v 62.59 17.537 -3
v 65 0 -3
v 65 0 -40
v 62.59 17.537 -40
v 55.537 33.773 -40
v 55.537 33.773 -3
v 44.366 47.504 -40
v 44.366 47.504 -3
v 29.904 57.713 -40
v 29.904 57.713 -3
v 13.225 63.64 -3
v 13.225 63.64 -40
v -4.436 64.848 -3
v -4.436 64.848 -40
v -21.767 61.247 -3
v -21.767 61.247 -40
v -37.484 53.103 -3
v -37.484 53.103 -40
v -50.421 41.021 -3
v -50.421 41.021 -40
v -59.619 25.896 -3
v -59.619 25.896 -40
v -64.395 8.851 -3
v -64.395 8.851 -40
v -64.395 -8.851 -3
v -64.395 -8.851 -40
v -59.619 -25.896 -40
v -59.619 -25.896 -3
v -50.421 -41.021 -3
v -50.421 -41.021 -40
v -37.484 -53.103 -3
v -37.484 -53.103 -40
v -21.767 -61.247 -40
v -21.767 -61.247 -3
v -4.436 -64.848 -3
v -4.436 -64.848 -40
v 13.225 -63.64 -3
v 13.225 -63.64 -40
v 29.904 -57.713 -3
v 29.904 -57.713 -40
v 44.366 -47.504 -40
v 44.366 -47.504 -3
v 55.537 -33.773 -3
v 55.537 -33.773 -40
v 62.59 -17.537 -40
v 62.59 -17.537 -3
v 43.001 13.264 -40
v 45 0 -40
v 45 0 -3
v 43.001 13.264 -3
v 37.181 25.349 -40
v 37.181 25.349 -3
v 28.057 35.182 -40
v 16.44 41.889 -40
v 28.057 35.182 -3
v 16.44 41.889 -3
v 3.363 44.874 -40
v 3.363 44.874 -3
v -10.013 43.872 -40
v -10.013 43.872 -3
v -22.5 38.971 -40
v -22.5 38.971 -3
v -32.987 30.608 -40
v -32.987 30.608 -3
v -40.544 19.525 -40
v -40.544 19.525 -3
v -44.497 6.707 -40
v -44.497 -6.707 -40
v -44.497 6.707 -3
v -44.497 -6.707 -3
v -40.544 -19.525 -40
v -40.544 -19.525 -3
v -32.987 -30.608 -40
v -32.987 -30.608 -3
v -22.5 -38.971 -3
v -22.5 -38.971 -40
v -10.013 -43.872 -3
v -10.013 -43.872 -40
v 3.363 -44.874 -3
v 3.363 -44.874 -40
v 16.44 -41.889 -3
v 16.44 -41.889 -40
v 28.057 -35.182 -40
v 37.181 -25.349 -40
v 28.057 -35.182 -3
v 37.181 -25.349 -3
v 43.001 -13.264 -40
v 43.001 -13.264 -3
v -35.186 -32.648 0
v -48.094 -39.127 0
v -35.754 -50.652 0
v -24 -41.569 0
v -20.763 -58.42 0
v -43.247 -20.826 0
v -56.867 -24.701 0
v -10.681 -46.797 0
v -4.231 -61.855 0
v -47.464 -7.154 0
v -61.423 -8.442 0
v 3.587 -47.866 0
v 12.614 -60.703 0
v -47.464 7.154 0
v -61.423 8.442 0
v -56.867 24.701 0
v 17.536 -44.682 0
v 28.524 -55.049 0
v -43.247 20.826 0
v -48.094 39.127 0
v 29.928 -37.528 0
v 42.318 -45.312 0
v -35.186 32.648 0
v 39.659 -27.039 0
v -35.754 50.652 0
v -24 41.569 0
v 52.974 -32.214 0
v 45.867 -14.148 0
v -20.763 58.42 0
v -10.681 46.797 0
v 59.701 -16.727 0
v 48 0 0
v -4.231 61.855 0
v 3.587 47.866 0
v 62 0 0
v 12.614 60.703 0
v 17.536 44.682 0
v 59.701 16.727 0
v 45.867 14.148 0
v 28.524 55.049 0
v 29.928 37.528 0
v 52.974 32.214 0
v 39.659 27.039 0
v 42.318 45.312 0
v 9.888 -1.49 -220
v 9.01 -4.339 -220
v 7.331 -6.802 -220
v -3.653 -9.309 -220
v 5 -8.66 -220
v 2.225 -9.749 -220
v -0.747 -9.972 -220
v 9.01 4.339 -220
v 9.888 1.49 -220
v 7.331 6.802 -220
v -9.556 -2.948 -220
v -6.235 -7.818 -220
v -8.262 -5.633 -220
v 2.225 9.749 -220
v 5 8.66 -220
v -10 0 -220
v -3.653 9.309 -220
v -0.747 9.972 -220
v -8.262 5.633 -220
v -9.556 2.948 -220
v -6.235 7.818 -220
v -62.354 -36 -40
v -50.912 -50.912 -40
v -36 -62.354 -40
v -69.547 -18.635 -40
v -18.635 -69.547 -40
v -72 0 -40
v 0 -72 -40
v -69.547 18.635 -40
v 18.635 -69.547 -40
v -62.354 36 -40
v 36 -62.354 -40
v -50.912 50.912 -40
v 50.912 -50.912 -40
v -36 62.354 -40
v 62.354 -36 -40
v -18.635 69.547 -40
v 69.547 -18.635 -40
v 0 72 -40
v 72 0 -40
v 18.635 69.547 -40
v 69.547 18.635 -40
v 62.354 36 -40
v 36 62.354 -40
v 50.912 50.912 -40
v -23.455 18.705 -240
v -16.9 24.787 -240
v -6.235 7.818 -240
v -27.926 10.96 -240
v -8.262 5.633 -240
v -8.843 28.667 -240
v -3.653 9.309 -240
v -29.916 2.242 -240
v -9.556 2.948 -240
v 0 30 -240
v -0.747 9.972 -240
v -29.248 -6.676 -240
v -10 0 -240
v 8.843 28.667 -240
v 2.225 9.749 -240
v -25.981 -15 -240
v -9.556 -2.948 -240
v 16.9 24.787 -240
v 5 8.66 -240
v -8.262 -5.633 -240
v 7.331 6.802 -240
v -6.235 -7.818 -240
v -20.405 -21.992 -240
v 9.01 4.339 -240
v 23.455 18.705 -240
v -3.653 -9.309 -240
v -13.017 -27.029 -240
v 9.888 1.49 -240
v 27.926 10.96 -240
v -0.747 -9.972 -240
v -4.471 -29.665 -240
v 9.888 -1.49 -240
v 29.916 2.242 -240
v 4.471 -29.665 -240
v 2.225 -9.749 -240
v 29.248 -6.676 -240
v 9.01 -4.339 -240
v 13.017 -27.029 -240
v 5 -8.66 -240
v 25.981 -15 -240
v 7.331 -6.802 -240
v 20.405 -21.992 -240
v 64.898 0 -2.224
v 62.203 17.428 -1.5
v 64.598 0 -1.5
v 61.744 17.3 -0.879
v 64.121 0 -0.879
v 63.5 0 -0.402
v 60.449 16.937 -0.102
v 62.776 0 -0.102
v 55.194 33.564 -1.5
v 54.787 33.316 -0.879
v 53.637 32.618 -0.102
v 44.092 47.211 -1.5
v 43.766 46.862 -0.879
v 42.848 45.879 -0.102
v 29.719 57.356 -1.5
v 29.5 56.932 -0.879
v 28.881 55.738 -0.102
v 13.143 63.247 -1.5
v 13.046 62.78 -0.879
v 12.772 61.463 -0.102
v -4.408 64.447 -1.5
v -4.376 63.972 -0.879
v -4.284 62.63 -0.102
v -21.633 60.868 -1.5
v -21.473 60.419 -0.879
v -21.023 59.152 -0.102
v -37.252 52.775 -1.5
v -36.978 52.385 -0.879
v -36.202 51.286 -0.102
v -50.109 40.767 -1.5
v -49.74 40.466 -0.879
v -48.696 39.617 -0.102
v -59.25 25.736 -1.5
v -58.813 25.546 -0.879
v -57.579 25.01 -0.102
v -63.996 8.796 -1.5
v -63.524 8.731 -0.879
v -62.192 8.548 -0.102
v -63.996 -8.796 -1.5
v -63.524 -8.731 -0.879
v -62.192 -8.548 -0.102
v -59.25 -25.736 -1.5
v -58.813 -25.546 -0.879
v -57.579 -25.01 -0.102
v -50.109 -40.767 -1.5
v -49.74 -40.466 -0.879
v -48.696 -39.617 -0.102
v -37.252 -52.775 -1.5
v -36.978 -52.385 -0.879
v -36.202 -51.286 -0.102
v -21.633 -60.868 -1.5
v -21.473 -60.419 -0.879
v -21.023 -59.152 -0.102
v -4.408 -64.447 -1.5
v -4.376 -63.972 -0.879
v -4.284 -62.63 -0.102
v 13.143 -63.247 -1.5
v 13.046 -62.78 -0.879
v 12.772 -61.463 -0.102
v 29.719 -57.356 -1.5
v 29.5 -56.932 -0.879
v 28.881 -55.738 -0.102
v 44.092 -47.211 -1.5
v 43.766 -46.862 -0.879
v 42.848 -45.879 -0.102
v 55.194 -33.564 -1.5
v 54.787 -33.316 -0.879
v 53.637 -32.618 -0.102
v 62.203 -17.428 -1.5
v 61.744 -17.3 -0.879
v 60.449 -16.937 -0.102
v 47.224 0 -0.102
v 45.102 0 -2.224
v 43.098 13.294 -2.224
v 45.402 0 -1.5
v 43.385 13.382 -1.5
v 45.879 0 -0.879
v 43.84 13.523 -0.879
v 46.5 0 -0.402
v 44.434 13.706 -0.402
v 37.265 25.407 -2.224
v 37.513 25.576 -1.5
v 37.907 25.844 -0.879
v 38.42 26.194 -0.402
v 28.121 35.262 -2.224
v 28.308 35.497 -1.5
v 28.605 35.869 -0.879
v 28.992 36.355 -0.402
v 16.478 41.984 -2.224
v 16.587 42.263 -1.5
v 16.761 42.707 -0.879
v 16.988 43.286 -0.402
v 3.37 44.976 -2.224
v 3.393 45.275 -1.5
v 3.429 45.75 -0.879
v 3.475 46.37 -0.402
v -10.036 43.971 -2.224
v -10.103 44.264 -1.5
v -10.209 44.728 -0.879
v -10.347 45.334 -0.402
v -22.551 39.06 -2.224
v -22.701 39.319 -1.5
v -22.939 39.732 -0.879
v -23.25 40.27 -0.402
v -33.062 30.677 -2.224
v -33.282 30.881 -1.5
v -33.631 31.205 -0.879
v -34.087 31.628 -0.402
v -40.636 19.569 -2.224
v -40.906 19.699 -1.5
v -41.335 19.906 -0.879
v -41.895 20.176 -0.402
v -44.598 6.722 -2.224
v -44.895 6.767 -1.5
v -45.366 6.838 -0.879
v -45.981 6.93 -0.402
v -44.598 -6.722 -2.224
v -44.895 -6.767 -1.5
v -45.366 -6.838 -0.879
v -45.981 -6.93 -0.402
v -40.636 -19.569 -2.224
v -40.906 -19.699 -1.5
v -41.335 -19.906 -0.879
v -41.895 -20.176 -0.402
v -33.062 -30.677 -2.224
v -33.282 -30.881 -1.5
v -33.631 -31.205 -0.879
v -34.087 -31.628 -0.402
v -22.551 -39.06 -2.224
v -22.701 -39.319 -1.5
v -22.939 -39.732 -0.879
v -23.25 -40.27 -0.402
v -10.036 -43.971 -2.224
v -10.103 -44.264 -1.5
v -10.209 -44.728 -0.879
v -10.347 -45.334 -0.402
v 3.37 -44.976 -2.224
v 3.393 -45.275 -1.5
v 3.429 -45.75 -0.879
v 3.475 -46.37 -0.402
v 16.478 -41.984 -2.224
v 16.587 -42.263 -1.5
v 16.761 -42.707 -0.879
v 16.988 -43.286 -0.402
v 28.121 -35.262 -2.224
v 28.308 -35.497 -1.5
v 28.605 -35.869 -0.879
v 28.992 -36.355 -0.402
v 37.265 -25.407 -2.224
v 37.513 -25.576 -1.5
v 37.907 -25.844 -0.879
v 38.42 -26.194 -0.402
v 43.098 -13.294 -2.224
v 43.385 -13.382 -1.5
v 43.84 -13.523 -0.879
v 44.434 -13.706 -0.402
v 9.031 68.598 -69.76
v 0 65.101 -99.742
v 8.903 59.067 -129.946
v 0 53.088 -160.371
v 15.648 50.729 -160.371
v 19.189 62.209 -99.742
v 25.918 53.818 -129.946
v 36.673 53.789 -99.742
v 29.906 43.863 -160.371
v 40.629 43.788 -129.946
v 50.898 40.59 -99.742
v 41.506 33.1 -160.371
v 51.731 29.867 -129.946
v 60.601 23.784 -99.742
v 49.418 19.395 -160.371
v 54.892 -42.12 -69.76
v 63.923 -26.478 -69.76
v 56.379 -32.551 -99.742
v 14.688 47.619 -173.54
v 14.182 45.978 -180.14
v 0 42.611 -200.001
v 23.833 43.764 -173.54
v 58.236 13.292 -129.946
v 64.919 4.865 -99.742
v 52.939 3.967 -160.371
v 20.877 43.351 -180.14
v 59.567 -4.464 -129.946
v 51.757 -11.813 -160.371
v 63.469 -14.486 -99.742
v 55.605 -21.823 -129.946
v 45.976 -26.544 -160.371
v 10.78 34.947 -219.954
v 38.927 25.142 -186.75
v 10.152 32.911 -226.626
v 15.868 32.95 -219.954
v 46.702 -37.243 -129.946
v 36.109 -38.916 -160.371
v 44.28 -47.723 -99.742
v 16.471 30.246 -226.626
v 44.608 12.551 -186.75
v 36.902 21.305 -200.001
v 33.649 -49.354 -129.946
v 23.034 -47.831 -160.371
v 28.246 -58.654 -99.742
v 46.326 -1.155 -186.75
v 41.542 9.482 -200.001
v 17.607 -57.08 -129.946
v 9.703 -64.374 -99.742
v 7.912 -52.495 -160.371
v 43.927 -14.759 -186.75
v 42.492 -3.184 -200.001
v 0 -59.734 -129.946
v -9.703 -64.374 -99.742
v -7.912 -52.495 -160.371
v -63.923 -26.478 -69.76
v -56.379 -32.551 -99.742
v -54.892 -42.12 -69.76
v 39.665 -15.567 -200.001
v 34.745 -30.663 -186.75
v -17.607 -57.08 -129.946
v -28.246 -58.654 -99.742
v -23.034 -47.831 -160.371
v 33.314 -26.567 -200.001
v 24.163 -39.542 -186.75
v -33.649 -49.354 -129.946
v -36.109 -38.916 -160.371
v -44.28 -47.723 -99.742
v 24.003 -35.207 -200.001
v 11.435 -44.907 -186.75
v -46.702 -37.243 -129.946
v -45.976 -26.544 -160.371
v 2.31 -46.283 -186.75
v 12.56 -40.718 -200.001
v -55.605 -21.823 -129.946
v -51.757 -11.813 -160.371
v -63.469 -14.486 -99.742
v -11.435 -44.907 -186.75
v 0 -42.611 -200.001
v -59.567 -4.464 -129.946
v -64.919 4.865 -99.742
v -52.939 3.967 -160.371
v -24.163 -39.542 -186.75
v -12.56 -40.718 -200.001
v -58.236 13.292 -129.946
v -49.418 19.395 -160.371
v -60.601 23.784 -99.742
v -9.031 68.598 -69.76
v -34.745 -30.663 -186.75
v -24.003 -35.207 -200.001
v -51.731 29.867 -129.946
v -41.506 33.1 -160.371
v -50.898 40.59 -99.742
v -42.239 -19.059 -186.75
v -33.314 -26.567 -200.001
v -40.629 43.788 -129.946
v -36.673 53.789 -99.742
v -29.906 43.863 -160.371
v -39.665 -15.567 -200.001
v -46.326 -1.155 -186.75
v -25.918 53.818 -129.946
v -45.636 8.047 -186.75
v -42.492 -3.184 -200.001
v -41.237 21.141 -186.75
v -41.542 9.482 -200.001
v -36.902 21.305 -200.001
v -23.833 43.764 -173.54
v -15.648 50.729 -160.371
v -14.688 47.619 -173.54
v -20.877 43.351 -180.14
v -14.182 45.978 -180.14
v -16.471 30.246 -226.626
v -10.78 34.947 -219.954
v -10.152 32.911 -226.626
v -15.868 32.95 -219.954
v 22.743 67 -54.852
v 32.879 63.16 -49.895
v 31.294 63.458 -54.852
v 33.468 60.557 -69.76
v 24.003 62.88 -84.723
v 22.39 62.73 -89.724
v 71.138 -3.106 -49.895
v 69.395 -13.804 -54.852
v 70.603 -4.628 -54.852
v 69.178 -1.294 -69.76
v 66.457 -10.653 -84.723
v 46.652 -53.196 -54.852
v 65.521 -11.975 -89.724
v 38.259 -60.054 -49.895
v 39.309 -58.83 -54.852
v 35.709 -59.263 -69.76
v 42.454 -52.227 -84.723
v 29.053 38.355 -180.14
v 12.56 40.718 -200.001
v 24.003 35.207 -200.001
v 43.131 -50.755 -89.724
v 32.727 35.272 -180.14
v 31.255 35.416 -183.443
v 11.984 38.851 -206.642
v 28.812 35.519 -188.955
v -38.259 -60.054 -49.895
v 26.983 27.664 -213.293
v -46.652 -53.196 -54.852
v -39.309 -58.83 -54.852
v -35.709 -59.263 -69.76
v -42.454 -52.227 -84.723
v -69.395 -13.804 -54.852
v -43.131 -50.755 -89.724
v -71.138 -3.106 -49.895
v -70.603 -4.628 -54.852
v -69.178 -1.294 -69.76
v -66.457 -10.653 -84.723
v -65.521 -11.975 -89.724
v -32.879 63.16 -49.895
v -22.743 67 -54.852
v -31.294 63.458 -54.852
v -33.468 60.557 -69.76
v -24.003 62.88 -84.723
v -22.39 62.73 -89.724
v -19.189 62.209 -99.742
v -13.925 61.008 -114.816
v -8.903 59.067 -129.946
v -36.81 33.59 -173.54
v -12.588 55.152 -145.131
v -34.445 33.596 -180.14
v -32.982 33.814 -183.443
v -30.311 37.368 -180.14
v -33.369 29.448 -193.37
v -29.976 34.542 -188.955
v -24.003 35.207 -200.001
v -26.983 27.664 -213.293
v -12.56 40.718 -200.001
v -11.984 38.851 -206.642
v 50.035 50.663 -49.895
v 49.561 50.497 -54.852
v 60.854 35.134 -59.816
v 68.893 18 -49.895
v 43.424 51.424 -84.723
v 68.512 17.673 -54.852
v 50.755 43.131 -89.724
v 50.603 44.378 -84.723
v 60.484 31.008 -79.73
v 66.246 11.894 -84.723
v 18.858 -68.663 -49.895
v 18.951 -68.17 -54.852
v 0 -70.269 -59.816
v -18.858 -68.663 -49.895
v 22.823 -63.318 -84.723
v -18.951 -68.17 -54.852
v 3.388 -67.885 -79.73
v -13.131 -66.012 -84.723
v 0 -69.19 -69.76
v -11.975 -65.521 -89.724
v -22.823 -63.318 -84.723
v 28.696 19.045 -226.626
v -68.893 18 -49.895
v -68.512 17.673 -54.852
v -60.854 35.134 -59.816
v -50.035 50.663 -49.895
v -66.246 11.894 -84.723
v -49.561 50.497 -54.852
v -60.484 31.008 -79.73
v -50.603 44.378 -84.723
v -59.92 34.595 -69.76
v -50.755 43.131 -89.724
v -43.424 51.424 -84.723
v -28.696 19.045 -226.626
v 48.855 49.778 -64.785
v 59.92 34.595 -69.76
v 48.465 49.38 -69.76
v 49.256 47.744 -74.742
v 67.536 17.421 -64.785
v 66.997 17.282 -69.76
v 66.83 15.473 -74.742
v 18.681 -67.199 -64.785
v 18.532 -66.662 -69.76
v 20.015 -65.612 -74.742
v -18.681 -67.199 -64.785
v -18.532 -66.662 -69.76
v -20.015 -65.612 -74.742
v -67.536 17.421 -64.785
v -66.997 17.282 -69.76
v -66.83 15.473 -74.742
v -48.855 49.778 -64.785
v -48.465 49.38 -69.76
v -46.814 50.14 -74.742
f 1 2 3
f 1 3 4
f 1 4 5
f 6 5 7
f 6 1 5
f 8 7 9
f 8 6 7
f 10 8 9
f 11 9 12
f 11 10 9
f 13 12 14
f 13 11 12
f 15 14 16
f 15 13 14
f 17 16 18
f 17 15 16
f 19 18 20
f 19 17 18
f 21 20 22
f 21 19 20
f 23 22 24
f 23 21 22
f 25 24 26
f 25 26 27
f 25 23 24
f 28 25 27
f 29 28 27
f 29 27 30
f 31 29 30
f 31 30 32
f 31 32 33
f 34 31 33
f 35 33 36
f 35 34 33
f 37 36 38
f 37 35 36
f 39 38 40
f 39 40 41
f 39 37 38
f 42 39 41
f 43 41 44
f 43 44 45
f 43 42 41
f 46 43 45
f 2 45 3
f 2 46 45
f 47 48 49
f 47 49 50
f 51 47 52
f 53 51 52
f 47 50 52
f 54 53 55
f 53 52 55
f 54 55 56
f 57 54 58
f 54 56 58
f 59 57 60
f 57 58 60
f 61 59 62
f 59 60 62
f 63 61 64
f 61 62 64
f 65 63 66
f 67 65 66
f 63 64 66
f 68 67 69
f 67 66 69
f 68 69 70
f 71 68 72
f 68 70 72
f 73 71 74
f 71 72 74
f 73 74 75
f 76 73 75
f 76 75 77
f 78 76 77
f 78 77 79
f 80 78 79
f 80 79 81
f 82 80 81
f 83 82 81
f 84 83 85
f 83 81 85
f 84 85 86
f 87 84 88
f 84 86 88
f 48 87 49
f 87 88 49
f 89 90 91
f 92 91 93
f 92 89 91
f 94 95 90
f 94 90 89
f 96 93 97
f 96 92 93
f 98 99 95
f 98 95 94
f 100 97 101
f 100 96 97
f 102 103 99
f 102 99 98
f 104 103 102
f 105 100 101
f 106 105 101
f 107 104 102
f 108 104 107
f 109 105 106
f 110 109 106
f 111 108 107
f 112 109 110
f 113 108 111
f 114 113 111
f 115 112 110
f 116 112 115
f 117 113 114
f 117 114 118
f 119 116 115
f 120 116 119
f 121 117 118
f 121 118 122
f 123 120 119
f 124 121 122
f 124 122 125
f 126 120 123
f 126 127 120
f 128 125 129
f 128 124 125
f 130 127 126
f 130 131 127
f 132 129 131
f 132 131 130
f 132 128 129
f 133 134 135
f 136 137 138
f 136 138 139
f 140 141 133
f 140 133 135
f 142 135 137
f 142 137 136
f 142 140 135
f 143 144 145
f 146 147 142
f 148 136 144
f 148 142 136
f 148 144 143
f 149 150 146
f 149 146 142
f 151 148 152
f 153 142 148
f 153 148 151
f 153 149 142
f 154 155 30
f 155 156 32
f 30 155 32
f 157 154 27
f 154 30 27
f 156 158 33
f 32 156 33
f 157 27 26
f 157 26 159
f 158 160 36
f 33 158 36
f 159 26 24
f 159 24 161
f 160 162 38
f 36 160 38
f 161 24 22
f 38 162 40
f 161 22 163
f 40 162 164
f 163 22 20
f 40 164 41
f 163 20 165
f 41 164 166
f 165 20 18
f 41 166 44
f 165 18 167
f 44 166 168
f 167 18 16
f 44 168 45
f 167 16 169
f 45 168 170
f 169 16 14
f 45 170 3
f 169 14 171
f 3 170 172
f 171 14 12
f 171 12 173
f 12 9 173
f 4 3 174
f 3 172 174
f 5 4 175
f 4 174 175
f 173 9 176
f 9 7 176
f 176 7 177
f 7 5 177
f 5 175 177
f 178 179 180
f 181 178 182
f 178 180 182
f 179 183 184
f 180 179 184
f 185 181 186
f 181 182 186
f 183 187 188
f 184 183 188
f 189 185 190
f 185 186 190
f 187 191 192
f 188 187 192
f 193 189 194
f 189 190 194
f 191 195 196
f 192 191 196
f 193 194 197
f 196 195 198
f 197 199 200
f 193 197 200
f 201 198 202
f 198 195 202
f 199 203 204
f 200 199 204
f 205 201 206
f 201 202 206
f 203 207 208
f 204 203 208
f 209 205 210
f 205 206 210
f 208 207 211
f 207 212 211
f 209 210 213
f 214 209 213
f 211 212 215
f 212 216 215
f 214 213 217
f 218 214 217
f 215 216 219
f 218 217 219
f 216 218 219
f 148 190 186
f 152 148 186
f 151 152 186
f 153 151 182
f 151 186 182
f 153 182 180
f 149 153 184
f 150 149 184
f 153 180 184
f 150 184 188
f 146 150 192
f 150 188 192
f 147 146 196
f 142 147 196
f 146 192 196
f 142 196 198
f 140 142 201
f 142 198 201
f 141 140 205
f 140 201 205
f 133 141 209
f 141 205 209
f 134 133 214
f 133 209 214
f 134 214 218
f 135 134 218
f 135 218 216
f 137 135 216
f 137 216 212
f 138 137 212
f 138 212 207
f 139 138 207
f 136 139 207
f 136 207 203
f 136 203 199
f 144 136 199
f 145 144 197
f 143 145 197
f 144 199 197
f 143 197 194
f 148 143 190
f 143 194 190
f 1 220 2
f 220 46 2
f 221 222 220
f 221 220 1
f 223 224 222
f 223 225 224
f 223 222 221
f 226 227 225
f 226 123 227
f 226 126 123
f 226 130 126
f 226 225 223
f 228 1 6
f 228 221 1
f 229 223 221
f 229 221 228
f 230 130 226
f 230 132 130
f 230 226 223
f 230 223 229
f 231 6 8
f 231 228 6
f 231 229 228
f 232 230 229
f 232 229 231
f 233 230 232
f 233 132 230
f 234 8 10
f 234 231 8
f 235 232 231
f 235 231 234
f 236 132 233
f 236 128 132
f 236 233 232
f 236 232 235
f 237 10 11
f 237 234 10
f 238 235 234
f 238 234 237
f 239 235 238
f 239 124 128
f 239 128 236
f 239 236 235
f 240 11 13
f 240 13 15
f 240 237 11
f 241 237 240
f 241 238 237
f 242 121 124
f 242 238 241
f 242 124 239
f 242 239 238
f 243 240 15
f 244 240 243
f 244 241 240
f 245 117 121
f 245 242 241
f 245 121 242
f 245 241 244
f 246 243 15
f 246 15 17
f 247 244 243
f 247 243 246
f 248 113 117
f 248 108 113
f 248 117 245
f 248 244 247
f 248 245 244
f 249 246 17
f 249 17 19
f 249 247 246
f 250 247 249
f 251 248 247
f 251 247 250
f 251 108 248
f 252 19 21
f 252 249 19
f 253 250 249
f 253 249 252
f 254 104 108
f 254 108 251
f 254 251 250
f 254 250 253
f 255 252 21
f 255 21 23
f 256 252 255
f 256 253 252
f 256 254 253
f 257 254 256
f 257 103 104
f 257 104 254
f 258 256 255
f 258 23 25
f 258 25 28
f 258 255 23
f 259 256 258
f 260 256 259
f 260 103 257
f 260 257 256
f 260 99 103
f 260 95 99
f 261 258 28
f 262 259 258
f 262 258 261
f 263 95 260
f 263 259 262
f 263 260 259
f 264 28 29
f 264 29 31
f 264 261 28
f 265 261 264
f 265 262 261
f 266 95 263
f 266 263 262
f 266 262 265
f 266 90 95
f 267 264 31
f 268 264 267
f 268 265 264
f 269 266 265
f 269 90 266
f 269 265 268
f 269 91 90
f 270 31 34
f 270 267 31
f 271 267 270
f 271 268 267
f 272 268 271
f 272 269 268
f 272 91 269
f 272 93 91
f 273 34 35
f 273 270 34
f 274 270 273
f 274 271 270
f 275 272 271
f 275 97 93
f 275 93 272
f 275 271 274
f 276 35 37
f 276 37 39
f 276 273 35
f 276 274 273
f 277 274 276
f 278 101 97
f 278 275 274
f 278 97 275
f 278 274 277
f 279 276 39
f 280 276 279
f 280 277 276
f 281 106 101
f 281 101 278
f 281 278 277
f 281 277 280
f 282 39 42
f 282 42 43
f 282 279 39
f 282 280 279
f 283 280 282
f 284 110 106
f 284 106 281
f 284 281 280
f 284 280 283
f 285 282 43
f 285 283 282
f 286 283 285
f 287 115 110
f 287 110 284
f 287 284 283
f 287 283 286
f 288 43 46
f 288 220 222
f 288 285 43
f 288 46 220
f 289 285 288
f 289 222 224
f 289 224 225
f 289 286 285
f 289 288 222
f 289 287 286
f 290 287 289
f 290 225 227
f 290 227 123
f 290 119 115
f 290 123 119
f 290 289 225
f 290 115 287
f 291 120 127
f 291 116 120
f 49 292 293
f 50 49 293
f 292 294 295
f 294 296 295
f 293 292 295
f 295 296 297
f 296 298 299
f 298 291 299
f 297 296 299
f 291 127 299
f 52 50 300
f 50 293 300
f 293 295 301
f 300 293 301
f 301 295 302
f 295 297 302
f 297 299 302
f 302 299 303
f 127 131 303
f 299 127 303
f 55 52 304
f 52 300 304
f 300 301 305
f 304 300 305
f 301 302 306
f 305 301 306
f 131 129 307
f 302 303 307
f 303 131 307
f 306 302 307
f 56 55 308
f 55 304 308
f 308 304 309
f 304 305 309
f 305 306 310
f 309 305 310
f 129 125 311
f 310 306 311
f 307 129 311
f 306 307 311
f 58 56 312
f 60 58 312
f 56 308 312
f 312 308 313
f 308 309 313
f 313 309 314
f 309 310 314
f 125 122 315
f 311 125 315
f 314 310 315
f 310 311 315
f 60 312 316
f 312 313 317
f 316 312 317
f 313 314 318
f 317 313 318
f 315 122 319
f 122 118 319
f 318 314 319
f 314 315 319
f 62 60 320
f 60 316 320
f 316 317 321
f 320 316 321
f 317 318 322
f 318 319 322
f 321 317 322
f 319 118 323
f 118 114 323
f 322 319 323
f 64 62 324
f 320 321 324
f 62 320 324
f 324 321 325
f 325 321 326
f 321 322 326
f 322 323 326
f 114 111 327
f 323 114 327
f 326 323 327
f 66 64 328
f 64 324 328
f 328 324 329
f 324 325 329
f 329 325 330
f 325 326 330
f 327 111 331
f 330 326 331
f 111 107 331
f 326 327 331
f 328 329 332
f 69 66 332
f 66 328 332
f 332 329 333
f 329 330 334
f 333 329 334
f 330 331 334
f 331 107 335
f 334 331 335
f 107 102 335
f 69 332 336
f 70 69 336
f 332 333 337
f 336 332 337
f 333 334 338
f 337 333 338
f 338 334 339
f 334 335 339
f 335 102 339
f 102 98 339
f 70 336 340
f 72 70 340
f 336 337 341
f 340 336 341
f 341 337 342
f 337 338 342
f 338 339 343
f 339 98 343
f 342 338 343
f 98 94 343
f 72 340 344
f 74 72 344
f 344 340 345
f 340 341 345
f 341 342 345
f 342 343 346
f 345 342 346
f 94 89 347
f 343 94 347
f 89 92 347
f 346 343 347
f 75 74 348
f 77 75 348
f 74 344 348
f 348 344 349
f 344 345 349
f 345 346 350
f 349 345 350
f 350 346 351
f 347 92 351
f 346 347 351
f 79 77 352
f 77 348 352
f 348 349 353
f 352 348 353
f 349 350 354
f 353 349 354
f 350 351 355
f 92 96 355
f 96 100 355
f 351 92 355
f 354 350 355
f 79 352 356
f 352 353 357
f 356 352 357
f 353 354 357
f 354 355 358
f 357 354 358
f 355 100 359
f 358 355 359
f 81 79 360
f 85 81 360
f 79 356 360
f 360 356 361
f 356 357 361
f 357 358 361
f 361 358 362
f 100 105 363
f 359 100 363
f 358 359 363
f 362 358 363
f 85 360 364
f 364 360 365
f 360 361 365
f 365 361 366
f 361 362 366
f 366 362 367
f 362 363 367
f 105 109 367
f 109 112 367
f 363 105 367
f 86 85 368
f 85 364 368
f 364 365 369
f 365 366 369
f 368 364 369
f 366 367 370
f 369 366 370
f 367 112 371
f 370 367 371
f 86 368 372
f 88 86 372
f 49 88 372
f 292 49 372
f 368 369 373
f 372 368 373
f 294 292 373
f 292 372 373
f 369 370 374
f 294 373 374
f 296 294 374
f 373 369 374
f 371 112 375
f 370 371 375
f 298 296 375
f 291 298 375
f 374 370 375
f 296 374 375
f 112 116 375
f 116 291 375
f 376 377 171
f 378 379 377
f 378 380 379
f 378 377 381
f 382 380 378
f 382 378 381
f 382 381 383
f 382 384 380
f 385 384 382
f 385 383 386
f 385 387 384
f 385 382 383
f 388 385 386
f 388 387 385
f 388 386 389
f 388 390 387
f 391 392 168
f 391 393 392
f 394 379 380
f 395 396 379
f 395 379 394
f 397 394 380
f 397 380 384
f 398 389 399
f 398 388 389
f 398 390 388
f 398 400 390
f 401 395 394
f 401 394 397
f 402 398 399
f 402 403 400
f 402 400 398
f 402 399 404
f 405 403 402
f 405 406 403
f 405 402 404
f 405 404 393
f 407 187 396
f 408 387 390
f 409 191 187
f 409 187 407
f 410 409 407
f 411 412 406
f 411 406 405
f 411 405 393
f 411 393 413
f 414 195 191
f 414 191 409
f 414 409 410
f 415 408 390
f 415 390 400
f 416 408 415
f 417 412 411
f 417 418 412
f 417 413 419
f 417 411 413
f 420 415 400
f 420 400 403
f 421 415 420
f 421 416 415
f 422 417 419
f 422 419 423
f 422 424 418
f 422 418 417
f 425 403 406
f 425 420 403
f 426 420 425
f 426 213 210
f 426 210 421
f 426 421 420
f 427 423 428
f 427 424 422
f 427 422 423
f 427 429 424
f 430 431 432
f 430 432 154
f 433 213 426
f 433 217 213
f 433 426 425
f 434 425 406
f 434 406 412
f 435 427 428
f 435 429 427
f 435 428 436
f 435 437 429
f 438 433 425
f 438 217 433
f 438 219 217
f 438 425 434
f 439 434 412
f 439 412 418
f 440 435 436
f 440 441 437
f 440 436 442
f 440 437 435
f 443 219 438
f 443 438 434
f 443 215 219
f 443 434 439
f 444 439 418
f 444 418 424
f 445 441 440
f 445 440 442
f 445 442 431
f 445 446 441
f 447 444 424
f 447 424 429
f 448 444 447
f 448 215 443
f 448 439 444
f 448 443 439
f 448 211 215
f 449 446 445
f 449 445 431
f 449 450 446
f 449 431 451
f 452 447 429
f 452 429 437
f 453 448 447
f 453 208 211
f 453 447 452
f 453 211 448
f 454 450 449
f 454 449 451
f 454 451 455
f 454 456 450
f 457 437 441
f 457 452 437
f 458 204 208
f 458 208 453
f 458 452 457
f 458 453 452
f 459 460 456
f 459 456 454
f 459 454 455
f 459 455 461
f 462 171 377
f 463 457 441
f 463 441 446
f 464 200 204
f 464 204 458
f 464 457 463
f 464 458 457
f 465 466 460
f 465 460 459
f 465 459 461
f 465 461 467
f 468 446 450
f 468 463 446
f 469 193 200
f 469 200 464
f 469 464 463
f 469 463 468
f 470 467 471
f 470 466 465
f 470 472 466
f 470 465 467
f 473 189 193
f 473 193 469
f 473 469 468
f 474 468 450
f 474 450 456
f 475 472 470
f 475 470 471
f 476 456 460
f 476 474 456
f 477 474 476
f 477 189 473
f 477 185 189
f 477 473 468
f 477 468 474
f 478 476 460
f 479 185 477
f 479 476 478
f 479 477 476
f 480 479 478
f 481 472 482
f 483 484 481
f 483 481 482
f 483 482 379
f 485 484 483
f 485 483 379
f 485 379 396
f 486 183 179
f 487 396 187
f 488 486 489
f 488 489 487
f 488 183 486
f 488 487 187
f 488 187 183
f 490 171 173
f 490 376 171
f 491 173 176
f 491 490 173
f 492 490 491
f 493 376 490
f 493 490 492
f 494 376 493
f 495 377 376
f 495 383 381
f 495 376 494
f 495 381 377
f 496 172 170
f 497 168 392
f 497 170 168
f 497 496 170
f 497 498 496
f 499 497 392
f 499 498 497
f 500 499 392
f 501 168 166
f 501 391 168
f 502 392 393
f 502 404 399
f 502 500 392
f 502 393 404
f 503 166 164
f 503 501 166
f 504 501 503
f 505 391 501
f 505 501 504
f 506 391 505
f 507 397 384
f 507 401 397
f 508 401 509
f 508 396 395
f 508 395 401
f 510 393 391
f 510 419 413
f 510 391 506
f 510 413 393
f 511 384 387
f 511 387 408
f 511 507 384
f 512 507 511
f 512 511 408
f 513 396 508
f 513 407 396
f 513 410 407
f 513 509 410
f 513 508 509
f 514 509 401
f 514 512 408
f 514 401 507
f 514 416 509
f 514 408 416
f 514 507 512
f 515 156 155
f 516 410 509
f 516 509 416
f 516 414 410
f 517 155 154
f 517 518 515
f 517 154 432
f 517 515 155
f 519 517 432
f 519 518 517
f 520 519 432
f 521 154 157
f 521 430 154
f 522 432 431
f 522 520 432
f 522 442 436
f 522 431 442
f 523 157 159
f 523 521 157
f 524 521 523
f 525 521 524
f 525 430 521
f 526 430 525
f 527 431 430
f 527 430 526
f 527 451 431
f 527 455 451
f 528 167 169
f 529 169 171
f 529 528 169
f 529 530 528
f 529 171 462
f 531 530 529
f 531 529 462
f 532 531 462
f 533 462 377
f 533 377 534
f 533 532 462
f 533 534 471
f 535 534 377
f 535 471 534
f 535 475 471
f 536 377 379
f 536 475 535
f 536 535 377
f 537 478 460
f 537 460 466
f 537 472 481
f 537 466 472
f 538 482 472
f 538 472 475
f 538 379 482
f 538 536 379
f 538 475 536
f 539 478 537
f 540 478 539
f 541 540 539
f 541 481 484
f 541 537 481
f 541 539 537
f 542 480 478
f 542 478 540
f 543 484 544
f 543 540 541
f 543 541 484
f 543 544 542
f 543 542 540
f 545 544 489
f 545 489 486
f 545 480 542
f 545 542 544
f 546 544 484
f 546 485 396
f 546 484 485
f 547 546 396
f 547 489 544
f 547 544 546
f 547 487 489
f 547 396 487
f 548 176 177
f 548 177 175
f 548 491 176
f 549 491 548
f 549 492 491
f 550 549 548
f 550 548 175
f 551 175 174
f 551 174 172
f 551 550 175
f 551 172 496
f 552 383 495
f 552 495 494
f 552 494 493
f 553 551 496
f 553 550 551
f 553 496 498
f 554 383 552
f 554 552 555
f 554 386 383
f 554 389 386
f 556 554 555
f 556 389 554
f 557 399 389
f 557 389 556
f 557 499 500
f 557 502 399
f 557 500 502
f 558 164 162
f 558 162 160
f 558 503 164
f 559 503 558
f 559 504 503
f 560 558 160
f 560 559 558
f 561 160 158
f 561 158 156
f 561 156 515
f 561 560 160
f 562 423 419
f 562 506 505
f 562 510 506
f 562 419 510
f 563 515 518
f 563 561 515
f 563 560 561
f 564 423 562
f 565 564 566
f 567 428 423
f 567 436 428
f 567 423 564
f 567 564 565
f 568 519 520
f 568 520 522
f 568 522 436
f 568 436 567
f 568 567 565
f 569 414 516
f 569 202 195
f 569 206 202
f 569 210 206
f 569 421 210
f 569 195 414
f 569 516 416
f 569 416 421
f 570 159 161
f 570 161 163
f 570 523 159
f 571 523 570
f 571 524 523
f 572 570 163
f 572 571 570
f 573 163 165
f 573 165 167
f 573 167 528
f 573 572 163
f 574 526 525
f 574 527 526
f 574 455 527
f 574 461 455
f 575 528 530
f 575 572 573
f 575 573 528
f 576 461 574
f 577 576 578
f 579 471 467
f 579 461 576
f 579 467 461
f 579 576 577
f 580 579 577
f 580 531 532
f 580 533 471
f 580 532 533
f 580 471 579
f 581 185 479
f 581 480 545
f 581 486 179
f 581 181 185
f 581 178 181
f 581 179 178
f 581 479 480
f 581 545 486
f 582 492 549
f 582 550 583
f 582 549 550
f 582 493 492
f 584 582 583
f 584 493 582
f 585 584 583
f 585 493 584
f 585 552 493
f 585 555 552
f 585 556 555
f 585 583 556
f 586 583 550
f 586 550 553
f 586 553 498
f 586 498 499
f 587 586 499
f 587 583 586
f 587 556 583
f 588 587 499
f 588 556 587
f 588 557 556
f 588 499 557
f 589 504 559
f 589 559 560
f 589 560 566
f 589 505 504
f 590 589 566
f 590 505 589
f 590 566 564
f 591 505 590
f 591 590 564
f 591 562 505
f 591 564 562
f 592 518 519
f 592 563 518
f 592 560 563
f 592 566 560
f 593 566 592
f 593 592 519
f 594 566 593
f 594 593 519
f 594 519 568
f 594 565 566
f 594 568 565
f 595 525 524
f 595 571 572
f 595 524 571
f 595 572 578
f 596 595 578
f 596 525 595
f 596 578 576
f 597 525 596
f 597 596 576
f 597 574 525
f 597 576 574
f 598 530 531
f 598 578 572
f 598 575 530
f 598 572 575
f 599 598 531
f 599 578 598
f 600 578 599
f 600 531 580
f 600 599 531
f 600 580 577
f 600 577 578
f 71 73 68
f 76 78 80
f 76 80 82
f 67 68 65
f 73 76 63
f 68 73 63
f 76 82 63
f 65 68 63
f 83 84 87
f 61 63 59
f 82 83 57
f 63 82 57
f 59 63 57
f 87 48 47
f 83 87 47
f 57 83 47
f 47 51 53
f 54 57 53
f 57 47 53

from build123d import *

# Parameters (mm, degrees)
SKETCH1_R           = 65
SKETCH1_R_2         = 45
BOSS_EXTRUDE1_DEPTH = 40
FILLET1_R           = 3
SKETCH4_R           = 10
CUT_EXTRUDE1_DEPTH  = 20


with BuildPart() as part:
    # Sketch1 → Boss-Extrude1 (new body)
    with BuildSketch(Plane.XY):
        Circle(SKETCH1_R)
        Circle(SKETCH1_R_2, mode=Mode.SUBTRACT)
    extrude(amount=-BOSS_EXTRUDE1_DEPTH)

    # Fillet1
    fillet1_edges = [part.edges().sort_by_distance(p)[0] for p in [
        (-65, 0, 0),
        (-45, 0, 0),
    ]]
    fillet(fillet1_edges, radius=FILLET1_R)

    # Sketch2 → Revolve1 (revolve)
    with BuildSketch(Plane(origin=(0, 0, 0), x_dir=(0, 0, -1), z_dir=(1, 0, 0))):
        with BuildLine():
            Line((40, 0), (240, 0))
            Line((240, 0), (240, 30))
            add(Edge.make_bspline(
                [(40, 72), (137.597263884, 64.854508863), (240, 30)],
                knots=[0, 0, 0, 1, 1, 1], degree=2))
            Line((40, 72), (40, 0))
        make_face()
    revolve(axis=Axis((0, 0, -40), (0, 0, -1)))

    # Sketch4 → Cut-Extrude1 (cut)
    with BuildSketch(Plane(origin=(0, 0, -240), x_dir=(-1, 0, 0), z_dir=(0, 0, -1))):
        Circle(SKETCH4_R)
    extrude(amount=-CUT_EXTRUDE1_DEPTH, mode=Mode.SUBTRACT)


solid = part.part
